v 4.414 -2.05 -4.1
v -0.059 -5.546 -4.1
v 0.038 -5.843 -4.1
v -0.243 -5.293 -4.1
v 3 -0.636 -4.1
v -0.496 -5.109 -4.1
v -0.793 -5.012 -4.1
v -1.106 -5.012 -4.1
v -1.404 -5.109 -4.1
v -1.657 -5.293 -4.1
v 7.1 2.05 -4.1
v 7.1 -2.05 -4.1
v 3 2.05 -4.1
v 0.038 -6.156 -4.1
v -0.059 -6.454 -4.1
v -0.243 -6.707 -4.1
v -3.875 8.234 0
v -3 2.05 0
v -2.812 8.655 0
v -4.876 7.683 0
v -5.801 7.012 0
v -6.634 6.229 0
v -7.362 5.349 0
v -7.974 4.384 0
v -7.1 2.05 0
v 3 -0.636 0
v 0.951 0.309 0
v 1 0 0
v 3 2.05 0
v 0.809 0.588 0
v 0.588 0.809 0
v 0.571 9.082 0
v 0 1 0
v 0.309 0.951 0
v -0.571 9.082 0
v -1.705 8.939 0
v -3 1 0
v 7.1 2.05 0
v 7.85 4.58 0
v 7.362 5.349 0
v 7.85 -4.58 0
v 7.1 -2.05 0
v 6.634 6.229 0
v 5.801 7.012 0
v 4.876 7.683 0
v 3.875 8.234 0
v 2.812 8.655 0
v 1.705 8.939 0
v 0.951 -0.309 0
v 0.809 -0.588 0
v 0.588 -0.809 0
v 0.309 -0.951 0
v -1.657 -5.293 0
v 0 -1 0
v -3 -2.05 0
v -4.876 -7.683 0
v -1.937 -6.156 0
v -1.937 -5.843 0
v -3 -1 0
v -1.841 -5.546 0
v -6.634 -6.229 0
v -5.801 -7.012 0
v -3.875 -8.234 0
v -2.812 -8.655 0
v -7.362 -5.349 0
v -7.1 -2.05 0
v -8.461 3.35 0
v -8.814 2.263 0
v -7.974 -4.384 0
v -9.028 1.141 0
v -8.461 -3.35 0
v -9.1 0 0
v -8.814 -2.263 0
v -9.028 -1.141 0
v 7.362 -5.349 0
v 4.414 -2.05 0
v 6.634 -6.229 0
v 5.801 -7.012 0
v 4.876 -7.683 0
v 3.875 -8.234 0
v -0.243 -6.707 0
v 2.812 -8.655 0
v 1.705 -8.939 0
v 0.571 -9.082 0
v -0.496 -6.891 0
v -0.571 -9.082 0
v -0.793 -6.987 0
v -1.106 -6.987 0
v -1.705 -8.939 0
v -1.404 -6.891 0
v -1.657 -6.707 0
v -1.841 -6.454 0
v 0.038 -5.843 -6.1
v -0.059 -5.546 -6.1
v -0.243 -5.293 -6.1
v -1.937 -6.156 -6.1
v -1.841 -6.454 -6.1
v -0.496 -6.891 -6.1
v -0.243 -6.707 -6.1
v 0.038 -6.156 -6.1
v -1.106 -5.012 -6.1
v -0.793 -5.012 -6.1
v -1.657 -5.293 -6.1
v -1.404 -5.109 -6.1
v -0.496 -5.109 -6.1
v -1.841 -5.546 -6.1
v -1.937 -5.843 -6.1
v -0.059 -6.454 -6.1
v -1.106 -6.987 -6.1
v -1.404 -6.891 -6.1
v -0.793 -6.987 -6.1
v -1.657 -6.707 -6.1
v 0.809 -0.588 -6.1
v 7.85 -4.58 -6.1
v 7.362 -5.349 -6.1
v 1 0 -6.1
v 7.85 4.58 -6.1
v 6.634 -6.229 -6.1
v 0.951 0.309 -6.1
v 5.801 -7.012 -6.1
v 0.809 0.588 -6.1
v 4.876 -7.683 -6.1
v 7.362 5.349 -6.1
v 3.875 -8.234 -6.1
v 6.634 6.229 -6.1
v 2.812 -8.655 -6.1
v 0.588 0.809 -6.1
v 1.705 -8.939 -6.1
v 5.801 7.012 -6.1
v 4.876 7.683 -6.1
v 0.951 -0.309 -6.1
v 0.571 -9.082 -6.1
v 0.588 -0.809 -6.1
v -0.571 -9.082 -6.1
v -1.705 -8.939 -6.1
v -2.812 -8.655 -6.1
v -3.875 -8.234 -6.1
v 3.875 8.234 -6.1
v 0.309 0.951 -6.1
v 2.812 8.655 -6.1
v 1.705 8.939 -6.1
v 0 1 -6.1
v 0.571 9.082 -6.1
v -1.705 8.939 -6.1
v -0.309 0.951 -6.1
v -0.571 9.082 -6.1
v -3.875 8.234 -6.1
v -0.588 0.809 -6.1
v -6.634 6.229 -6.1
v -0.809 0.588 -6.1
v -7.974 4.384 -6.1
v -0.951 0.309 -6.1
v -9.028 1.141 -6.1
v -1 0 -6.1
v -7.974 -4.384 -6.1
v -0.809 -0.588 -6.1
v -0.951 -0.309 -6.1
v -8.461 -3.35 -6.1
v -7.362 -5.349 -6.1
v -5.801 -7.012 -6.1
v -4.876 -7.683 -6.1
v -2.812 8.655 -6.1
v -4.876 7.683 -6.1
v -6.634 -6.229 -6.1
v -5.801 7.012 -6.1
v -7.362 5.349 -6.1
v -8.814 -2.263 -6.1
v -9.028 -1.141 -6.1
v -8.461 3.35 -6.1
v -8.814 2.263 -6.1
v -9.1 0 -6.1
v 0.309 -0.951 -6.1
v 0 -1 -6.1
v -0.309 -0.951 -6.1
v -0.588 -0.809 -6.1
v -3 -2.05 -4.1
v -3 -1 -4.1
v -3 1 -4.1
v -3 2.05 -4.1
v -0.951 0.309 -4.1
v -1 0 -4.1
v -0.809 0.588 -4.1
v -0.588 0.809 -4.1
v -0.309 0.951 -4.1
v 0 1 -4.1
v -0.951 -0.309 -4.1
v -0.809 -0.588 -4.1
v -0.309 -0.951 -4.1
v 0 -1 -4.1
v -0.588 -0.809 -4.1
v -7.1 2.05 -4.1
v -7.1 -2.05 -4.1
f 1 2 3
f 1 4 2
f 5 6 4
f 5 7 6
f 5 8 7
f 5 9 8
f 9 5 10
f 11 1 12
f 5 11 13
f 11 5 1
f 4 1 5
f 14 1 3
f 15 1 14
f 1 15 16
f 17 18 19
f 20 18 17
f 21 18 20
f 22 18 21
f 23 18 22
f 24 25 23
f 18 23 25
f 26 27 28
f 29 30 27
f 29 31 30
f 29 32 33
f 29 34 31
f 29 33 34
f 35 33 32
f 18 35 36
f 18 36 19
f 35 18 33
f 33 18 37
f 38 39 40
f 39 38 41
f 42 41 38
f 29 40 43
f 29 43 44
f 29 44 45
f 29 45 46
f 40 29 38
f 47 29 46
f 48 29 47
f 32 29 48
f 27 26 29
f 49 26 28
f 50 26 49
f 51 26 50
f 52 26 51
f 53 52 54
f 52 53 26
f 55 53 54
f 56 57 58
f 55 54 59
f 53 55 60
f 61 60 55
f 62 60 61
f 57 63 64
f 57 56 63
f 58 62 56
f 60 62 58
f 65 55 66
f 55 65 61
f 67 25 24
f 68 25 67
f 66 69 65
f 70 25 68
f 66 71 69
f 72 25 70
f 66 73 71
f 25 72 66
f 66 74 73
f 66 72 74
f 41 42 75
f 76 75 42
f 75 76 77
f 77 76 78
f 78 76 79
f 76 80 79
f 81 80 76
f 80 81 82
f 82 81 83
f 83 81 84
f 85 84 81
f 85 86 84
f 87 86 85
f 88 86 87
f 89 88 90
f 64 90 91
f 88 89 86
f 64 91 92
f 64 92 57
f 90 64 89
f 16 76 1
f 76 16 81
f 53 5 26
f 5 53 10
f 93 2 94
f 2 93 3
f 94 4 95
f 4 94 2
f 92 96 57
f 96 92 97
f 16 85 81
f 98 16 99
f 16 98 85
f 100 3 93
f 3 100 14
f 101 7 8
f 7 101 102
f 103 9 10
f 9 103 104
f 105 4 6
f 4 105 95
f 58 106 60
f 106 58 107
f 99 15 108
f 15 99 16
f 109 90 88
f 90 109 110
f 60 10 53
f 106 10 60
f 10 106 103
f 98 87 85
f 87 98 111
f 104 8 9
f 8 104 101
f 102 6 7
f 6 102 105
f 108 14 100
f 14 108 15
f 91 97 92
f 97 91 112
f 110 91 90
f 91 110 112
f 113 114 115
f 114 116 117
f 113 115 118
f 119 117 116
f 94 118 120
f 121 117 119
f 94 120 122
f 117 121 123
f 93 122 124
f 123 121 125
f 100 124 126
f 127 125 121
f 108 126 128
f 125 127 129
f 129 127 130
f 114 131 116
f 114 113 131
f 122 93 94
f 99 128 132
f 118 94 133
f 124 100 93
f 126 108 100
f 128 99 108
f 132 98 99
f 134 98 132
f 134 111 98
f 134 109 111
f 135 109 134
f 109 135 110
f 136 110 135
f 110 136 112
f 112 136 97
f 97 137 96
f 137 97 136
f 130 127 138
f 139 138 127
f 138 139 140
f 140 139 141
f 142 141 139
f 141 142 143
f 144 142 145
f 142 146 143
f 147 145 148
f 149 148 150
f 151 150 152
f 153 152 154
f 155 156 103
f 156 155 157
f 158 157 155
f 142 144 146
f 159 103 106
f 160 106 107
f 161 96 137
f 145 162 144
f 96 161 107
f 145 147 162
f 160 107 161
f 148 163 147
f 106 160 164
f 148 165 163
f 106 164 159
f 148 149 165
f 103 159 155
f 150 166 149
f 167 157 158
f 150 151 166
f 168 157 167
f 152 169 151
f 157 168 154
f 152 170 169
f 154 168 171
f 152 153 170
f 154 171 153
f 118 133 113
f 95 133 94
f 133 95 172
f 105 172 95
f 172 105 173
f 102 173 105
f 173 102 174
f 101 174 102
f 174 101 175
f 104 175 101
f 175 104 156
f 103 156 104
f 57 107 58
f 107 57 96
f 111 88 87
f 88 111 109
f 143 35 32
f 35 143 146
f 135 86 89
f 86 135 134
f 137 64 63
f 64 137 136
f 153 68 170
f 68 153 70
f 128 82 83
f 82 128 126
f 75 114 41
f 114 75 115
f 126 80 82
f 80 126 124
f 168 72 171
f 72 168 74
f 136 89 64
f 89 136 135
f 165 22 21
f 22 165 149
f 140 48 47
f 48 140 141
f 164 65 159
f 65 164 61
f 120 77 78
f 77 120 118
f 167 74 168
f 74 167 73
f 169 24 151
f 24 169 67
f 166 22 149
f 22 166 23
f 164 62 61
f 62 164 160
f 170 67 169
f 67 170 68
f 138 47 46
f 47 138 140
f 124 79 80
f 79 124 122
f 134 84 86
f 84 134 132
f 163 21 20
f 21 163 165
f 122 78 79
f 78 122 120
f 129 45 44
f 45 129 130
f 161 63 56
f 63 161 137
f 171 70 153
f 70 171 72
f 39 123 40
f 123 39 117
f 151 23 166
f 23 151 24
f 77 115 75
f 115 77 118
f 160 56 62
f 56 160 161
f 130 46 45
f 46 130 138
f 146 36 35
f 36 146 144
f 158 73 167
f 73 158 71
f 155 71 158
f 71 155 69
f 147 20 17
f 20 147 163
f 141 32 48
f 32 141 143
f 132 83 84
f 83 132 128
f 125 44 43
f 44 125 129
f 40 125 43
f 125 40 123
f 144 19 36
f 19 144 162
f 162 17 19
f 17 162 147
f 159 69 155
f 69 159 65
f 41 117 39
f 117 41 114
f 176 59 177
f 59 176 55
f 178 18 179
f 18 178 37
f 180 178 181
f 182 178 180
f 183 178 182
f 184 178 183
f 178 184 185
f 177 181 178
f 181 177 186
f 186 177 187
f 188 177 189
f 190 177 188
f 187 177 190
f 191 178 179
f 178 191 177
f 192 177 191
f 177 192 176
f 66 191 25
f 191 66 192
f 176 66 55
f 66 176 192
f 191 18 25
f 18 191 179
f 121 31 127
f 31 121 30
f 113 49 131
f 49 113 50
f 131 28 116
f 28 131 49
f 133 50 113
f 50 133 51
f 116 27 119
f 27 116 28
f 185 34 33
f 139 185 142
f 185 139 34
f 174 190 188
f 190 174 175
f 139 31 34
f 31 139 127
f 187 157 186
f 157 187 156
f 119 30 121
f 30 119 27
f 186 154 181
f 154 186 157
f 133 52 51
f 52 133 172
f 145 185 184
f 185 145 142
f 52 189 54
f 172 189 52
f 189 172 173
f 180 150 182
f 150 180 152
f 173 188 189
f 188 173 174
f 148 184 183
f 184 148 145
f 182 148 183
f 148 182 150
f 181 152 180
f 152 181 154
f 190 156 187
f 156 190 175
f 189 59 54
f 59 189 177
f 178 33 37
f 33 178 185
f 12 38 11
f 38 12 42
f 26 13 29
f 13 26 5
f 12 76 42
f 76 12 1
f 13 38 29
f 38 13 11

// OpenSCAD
/*
 * A holder to make miniature spotlights out of LEDs.
 *
 * This uses two square magnets to make contact with a power supply. The magnets
 * connect to a resistor (on the - side) and a wire on the + side. There are
 * two holes that go through the holder to the LED itself.
 *
 * All units here are in mm.
 */

// Size of the magnets (mm).
magnet_size=4.1;

// Distance from the center of the holder to the edge of the magnets.
center_offset=3;

// Diameter of the center hole.
center_hole=2;

// Height of the housing above the magnet.
height_above_magnets=2;

// Distance from the edge of the magnet to the edge of the housing.
magnet_to_wall=2;

// Size of the polarity keying. This is a notch cut out of the body, marking
// the cathode (-). This is the same as the flat spot on LEDs.
key_size=1.25;

// Length of the resistor channel (this is the length of your resistor, plus a
// little wiggle room for the leads).
resistor_x=7;

// Width of the resistor channel (this is the width of your resistor).
resistor_y=2;

// Size of the hole for the resistor. This should probably be the same as the
// center_hole.
resistor_hole=2;

/////////////////////////////////////////////////////////////////////

resistor_z=magnet_size;

top_h=height_above_magnets;

body_radius = magnet_size + center_offset + magnet_to_wall;
body_height=magnet_size+top_h;

/*
 * Rotate the body to make it printable on an extrusion printer.
 */
rotate([-180,0,0]){
	magnet_holder();
}

/*
 * The body of the holder.
 */
module magnet_holder(){
	difference(){
		// The main body of the holder.
		cylinder(h=body_height,r=body_radius,$fn=50);

		// Polarity key (this marks the cathode).
		translate([body_radius - key_size,-body_radius,0])
			cube([key_size, body_radius*2, body_height]);

		// Left magnet (anode, positive).
		translate([-magnet_size/2-center_offset,0,magnet_size/2]){
			magnet();
		}
		// Hole in the center for the cathode.
		cylinder(h=magnet_size+top_h,r=center_hole/2,$fn=20);

		// Channel to pass wire from the magnet to the center hole.
		translate([-4,-center_hole/2,0])
			cube([4,center_hole,magnet_size]);

		// Right magnet (cathode, negative).
		translate([magnet_size/2+center_offset,0,magnet_size/2]){
			magnet();
		}

		// Hole for resistor connected to the cathode.
		translate([center_offset+resistor_y/2,magnet_size/2-resistor_y/2,0]){
			rotate([0,0,-45]){
				translate([-resistor_x,-resistor_y/2,0]){
						cube([resistor_x,resistor_y,resistor_z]);

					// Hole for wire on other side of resistor.
					translate([0,resistor_y/2,0]){
						cylinder(h=magnet_size+top_h,r=resistor_hole/2,$fn=20);
					}
				}
			}
		}
	}
}

/*
 * An individual square magnet cavity.
 */
module magnet(){
	cube([magnet_size,magnet_size,magnet_size],center=true);
}
